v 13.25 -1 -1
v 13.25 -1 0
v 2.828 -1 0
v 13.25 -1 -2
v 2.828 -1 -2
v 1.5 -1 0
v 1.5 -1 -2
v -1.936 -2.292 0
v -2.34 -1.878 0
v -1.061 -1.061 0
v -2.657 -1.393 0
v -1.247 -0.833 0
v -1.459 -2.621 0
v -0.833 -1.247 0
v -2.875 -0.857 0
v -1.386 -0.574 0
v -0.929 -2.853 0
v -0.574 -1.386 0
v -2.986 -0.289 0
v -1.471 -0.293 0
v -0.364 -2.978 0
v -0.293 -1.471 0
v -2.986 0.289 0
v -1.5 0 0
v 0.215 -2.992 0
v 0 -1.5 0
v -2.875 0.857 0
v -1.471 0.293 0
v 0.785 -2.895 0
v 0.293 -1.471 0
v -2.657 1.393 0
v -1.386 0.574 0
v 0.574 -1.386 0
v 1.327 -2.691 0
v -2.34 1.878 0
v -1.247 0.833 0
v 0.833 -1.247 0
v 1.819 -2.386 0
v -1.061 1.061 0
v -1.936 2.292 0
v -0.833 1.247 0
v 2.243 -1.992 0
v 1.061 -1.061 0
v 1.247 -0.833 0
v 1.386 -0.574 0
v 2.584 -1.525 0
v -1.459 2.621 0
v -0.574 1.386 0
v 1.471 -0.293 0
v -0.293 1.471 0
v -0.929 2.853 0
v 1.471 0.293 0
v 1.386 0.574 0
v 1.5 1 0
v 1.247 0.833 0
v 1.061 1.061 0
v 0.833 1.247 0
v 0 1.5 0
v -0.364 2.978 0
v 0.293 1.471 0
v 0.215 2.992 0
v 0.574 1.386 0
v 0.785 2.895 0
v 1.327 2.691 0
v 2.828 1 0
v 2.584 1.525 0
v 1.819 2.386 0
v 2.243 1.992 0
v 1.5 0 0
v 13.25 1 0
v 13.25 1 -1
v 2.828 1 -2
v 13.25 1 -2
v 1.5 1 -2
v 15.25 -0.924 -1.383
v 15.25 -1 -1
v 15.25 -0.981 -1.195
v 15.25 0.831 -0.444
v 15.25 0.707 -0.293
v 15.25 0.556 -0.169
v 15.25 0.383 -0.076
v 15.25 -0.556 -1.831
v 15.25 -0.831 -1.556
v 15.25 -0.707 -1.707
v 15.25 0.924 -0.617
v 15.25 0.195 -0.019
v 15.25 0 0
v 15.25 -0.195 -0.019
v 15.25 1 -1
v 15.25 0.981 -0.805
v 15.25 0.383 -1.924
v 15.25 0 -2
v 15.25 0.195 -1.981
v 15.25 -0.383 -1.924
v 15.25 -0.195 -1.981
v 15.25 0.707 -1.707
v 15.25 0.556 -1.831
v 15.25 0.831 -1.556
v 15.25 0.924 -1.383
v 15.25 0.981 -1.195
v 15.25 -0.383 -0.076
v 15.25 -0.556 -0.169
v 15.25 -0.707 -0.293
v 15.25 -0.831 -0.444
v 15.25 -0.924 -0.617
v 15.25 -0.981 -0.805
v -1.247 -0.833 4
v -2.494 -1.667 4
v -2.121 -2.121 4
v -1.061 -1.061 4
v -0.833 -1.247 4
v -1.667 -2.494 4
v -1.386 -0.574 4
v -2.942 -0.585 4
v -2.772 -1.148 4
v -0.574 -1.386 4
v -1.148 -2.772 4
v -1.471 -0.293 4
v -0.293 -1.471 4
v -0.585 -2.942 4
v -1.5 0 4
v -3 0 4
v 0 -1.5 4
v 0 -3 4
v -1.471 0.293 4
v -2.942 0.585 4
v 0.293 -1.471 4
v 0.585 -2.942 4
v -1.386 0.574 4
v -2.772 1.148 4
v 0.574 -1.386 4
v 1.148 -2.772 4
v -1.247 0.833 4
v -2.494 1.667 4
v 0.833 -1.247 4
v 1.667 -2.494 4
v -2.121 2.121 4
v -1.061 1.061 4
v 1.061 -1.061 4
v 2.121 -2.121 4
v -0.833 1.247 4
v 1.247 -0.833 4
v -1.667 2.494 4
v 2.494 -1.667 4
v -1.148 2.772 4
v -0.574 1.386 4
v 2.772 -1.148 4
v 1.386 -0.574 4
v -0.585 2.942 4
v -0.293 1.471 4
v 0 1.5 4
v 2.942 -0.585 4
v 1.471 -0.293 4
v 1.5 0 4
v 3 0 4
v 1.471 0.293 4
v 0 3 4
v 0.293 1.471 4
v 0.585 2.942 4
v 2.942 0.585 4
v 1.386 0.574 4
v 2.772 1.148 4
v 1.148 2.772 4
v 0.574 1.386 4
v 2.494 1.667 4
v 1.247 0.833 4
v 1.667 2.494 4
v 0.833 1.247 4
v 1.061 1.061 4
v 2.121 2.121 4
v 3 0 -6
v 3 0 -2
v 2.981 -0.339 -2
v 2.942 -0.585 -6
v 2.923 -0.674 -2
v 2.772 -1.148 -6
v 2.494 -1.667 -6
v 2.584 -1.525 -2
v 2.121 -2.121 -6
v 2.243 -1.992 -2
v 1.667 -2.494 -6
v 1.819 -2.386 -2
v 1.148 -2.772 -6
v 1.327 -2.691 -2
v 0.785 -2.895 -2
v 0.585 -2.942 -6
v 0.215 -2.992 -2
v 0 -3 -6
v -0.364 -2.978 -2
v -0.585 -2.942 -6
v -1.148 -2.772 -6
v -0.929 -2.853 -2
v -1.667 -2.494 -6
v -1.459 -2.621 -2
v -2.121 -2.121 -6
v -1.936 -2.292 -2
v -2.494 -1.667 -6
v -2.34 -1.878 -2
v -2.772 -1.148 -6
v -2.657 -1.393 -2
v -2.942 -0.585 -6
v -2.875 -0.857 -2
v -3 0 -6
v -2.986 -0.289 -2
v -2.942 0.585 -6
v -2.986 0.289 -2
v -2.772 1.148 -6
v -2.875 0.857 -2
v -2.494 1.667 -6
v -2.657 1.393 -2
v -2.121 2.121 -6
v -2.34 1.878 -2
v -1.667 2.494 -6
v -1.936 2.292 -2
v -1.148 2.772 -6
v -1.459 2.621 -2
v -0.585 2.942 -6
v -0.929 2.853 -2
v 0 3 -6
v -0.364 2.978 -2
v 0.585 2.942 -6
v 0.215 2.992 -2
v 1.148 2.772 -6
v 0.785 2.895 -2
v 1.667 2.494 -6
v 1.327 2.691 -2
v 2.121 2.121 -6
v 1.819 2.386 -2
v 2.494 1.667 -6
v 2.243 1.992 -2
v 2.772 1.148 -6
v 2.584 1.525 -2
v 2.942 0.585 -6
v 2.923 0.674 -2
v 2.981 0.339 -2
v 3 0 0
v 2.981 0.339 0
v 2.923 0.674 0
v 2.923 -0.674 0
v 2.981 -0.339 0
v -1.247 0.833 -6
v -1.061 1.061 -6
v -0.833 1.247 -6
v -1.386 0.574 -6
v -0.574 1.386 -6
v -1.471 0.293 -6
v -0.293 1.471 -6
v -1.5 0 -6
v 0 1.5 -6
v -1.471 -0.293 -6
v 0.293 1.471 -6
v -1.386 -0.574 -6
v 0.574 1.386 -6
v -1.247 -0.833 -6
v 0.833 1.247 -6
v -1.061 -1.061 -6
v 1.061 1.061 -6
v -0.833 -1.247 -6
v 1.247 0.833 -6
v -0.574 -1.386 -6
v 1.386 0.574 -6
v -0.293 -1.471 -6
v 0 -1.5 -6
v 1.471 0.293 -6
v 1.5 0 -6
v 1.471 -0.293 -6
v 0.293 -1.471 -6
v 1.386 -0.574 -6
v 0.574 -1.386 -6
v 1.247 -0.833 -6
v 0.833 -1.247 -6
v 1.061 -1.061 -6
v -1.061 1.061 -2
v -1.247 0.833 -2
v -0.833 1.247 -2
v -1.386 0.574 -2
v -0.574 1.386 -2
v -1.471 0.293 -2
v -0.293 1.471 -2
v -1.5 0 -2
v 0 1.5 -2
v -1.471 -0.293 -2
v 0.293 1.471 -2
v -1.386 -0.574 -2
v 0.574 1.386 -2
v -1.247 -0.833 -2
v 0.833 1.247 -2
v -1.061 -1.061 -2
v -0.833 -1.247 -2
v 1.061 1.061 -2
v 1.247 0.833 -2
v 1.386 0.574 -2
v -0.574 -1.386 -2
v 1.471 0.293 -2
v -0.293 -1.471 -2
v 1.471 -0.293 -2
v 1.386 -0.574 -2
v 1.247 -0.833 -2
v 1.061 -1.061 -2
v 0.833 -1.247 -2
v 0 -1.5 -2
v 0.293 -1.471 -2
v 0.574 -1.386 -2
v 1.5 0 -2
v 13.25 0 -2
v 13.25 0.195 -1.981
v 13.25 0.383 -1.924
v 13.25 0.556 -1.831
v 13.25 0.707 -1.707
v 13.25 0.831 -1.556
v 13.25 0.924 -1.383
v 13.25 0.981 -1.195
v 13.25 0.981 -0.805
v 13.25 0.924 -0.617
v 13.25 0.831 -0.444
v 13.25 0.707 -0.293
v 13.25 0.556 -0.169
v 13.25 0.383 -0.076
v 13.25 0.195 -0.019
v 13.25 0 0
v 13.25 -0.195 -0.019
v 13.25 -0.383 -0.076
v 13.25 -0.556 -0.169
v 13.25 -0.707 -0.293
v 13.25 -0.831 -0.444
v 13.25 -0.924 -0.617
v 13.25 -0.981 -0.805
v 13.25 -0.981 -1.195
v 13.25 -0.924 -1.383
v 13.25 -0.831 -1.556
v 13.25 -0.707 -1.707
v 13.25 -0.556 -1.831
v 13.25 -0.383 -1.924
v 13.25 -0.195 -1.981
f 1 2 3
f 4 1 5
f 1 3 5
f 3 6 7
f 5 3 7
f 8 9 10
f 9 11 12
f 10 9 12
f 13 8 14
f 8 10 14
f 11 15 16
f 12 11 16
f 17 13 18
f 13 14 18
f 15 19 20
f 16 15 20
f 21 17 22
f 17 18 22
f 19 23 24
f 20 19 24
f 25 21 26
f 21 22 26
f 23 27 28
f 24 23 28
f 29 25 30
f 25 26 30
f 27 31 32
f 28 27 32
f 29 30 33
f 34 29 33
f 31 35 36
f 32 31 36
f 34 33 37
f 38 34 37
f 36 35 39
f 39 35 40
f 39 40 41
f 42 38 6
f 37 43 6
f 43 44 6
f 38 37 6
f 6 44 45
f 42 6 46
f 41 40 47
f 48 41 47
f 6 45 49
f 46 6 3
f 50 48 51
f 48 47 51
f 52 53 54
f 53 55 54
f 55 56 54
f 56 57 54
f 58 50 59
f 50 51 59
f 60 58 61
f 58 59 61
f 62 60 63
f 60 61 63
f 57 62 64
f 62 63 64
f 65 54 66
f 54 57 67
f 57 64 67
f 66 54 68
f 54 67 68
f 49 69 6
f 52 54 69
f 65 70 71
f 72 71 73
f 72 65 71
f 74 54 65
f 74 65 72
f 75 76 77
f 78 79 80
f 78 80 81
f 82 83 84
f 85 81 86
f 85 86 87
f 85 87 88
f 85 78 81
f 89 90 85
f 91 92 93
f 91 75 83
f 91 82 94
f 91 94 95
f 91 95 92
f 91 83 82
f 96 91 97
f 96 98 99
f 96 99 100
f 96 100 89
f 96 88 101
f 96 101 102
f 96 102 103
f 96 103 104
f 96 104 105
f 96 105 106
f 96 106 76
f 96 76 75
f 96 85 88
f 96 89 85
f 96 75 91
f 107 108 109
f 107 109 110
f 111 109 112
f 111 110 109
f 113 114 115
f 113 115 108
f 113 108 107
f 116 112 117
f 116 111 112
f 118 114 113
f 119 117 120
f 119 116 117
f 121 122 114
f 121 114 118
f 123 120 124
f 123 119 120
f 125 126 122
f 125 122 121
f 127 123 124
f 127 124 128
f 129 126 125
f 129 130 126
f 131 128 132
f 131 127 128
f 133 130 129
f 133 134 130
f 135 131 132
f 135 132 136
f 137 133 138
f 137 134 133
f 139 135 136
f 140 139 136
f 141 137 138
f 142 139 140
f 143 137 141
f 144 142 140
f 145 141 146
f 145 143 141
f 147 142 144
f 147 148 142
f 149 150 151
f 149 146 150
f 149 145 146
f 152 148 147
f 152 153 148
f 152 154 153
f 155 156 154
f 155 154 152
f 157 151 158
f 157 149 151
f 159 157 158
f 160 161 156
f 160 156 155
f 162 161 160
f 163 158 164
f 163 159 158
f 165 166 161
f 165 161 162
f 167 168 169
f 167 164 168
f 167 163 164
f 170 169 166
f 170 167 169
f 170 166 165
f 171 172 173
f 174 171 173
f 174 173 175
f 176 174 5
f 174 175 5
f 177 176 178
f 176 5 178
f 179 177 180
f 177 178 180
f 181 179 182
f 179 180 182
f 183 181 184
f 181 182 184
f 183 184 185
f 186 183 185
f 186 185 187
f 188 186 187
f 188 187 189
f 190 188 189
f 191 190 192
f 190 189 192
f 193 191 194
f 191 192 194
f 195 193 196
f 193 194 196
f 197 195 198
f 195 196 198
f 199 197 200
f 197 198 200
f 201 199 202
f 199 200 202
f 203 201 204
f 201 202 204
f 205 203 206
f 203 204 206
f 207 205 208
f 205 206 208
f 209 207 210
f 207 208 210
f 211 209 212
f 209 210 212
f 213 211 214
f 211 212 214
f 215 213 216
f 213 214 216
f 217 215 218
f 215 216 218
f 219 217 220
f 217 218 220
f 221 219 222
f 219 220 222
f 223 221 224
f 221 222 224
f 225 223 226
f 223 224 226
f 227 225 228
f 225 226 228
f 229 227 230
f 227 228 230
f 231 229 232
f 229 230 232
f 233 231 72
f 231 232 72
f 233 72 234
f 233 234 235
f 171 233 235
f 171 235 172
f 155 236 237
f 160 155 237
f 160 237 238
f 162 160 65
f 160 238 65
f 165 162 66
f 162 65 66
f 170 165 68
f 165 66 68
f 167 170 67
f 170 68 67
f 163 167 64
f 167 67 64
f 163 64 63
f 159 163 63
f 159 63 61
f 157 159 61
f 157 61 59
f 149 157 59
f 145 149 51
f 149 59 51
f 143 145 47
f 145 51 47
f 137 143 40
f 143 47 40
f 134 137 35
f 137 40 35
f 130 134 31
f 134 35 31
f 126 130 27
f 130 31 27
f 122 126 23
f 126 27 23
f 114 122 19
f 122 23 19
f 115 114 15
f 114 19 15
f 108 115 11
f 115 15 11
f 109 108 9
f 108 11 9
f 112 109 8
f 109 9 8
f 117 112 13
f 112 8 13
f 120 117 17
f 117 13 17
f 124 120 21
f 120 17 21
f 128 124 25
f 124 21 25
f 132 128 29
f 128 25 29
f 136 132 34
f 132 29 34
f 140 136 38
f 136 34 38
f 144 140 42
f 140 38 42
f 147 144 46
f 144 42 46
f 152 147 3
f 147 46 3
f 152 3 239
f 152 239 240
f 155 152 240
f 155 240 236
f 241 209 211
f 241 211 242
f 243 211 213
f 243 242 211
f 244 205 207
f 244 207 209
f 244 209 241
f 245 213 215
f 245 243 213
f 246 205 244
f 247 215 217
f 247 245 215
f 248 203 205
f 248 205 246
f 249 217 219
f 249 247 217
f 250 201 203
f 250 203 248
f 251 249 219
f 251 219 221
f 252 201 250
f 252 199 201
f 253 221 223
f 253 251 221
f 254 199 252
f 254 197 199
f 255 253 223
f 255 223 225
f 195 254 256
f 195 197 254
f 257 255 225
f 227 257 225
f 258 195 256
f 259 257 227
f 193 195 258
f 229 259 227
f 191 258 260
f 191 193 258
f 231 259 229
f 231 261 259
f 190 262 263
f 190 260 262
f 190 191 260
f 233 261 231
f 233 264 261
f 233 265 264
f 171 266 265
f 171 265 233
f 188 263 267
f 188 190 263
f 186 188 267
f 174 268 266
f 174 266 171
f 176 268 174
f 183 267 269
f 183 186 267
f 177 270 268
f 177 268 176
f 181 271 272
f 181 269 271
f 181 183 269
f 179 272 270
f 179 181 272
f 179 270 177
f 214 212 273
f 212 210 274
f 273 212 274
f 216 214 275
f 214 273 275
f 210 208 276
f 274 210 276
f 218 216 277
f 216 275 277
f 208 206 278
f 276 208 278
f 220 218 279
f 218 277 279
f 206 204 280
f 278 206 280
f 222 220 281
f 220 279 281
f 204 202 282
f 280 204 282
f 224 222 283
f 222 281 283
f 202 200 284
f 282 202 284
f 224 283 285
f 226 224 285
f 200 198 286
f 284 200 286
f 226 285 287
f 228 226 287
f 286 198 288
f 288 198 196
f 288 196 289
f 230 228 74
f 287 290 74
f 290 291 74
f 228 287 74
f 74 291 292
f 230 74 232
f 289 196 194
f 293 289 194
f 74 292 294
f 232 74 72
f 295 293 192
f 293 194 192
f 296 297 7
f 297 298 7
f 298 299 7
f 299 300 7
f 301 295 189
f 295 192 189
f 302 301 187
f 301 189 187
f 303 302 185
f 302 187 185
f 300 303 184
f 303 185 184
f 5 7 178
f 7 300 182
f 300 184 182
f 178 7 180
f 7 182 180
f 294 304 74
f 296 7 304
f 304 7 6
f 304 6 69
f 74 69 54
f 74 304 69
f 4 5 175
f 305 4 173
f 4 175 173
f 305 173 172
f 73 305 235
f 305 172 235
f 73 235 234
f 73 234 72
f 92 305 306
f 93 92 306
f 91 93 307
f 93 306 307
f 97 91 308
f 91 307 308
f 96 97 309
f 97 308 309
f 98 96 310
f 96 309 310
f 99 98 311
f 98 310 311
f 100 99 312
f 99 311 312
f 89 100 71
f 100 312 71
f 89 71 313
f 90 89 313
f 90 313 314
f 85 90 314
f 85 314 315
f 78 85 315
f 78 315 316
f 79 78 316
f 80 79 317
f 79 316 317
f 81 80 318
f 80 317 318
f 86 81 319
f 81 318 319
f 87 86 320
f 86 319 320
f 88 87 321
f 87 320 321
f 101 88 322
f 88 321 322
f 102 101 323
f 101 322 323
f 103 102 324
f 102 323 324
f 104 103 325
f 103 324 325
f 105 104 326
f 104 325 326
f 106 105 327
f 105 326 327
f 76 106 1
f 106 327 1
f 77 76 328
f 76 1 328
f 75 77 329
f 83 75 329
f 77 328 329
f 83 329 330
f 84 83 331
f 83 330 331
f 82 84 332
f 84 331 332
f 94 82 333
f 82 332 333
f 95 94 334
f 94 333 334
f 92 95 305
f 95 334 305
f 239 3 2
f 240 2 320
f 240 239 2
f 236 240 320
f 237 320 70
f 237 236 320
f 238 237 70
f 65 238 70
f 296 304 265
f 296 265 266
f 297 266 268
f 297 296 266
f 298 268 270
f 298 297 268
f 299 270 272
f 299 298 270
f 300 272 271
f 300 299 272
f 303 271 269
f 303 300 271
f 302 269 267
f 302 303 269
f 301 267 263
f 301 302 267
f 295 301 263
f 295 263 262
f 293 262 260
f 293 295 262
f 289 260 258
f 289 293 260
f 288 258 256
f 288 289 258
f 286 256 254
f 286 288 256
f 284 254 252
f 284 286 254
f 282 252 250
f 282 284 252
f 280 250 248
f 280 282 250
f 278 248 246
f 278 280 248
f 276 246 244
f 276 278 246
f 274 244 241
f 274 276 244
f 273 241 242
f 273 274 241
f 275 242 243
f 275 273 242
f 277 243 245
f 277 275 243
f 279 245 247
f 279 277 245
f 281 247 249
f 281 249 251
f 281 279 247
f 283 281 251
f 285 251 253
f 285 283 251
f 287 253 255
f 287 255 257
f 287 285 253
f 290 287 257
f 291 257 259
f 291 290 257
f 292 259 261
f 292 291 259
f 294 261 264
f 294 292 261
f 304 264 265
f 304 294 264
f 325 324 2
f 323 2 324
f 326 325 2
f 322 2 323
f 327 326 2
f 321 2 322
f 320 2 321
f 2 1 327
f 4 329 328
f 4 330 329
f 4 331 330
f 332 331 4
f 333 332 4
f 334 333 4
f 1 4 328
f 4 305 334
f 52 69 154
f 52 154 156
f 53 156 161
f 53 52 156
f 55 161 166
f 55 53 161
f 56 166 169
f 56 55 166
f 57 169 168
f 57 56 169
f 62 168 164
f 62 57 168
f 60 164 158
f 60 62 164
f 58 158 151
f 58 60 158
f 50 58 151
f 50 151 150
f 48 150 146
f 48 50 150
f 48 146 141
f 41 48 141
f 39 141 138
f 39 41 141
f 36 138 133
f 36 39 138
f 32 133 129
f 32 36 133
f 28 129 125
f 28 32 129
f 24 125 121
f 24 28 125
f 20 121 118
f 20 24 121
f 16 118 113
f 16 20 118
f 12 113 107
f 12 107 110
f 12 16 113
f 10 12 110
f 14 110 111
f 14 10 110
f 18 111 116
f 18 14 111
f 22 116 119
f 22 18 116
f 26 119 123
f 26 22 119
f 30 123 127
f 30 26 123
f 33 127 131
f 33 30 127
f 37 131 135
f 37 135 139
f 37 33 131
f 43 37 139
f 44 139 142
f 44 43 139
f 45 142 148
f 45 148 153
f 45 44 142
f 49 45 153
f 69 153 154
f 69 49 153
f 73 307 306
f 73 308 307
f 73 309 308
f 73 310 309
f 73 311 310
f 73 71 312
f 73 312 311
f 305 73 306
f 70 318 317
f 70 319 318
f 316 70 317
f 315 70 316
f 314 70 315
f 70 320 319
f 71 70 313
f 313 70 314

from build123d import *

# Parameters (mm, degrees)
SKETCH1_R           = 3
SKETCH1_R_2         = 1.5
BOSS_EXTRUDE1_DEPTH = 4
SKETCH2_R           = 3
SKETCH2_R_2         = 1.5
BOSS_EXTRUDE2_DEPTH = 4
BOSS_EXTRUDE3_REACH = 9.348
SKETCH3_W           = 1
SKETCH3_H           = 2
SKETCH4_W           = 2
SKETCH4_H           = 2
BOSS_EXTRUDE4_DEPTH = 10.75
SKETCH6_R           = 1
BOSS_EXTRUDE5_DEPTH = 2


with BuildPart() as part:
    # Sketch1 → Boss-Extrude1 (new body)
    with BuildSketch(Plane.XY):
        Circle(SKETCH1_R)
        Circle(SKETCH1_R_2, mode=Mode.SUBTRACT)
    extrude(amount=BOSS_EXTRUDE1_DEPTH)

    # Sketch3 → Boss-Extrude3 (add, up to next)
    with BuildSketch(Plane.XY.offset(-2), mode=Mode.PRIVATE) as boss_extrude3_sk1:
        with Locations((2, 0)):
            Rectangle(SKETCH3_W, SKETCH3_H)
    boss_extrude3_tool1 = extrude(boss_extrude3_sk1.sketch, amount=BOSS_EXTRUDE3_REACH, mode=Mode.PRIVATE) - part.part


with BuildPart() as body_2:
    # Sketch2 → Boss-Extrude2 (new body)
    with BuildSketch(Plane(origin=(0, 0, -2), x_dir=(-1, 0, 0), z_dir=(0, 0, -1))):
        with Locations(Location((0, 0, 0), (0, 0, 180))):
            Circle(SKETCH2_R)
        with Locations(Location((0, 0, 0), (0, 0, 180))):
            Circle(SKETCH2_R_2, mode=Mode.SUBTRACT)
    extrude(amount=BOSS_EXTRUDE2_DEPTH)


with BuildPart() as part_1:
    add(part.part)

    add(body_2.part)  # Boss-Extrude3 merges body 2
    add(boss_extrude3_tool1.solids().sort_by_distance((2, 0, -2))[0])

    # Sketch4 → Boss-Extrude4 (add)
    with BuildSketch(Plane(origin=(2.5, 0, 0), x_dir=(0, 0, -1), z_dir=(1, 0, 0))):
        with Locations((1, 0)):
            Rectangle(SKETCH4_W, SKETCH4_H)
    extrude(amount=BOSS_EXTRUDE4_DEPTH)

    # Sketch6 → Boss-Extrude5 (add)
    with BuildSketch(Plane(origin=(13.25, 0, 0), x_dir=(0, 0, -1), z_dir=(1, 0, 0))):
        with Locations((1, 0)):
            Circle(SKETCH6_R)
    extrude(amount=BOSS_EXTRUDE5_DEPTH)


solid = part_1.part
